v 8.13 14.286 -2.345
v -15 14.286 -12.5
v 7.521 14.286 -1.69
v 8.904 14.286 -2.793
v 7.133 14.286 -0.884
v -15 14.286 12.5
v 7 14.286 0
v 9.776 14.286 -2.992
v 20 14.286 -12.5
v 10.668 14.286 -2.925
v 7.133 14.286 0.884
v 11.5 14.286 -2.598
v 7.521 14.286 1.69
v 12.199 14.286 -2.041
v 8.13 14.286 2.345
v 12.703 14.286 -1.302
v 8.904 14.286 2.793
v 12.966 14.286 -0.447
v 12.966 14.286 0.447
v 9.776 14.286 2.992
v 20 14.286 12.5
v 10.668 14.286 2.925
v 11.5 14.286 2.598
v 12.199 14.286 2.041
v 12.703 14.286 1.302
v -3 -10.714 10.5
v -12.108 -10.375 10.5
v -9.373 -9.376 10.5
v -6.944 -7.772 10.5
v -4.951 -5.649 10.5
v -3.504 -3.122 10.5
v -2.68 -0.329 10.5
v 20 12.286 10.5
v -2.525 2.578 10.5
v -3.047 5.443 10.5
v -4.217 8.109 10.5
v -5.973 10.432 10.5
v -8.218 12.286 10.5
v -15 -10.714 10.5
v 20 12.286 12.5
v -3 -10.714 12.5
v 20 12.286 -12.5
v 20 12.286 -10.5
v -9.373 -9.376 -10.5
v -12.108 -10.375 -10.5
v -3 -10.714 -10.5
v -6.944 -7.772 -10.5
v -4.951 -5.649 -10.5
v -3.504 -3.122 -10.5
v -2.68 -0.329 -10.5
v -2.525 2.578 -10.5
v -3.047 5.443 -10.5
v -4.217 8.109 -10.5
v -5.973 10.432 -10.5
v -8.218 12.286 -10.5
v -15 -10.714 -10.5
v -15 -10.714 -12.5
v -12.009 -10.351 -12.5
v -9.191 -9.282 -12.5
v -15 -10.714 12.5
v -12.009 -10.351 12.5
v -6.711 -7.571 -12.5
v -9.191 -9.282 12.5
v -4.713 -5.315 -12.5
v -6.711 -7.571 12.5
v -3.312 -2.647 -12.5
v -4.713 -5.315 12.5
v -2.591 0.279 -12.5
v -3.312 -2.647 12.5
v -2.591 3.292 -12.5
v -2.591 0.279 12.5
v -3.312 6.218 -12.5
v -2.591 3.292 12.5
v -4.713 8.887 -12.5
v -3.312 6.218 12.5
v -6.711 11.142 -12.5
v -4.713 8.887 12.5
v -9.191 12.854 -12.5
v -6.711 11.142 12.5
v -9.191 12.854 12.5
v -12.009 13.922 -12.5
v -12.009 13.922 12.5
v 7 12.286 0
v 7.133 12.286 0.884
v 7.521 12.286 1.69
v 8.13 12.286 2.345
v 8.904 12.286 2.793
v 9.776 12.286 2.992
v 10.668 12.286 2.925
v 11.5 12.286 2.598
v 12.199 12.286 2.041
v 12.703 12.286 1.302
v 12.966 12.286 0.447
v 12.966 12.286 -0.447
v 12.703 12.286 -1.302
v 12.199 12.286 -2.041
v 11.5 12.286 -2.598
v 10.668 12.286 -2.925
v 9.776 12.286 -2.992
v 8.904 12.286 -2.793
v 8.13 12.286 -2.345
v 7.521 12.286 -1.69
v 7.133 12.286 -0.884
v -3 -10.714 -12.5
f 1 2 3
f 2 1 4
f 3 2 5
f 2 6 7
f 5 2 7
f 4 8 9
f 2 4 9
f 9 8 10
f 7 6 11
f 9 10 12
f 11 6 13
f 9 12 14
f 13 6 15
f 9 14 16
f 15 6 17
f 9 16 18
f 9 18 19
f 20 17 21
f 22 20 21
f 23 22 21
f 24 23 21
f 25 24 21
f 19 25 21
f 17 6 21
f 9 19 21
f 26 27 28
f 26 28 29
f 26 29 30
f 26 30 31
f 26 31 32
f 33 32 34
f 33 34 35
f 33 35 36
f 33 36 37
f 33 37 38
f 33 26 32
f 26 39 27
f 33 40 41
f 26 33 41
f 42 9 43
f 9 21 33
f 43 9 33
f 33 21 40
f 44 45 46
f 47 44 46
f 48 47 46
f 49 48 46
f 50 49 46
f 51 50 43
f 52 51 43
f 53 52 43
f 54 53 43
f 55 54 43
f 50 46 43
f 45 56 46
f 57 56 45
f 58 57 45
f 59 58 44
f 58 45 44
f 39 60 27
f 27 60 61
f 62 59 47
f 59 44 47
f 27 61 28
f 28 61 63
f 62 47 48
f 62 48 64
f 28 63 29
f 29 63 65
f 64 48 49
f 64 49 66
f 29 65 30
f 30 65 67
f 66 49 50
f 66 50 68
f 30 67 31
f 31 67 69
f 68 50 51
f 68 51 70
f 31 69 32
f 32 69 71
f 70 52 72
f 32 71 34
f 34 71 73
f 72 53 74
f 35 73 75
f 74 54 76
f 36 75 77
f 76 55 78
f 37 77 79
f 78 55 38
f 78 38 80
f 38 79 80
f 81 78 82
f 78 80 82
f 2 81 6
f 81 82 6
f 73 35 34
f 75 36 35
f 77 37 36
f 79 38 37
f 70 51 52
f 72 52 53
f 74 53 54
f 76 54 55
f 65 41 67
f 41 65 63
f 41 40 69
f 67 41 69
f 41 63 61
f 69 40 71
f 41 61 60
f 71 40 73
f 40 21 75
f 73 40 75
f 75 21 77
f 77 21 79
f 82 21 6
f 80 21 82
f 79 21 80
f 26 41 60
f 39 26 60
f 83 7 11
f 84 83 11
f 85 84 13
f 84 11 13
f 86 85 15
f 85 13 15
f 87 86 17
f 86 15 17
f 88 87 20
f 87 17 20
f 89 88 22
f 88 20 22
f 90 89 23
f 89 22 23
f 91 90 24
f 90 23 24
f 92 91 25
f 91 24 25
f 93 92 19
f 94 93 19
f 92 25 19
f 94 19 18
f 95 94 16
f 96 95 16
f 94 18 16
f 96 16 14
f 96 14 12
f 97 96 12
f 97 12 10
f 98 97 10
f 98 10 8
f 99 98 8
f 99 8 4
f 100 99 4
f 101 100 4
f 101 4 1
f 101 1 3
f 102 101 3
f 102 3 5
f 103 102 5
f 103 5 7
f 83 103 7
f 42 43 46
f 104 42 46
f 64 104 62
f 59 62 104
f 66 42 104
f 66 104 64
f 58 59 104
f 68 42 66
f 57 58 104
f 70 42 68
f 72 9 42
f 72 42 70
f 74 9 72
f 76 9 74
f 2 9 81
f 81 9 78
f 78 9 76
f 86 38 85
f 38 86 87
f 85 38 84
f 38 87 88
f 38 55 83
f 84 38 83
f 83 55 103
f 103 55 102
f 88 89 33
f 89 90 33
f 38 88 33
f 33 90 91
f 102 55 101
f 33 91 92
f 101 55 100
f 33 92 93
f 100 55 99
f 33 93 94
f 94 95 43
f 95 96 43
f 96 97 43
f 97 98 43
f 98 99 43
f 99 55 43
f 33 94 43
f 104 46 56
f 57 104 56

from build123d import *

# Parameters (mm, degrees)
DODANIE_WYCI_GNI_CIE1_DEPTH = 12.5
SKORUPA2_START              = -10.714285714
SKORUPA2_OUTLINE_W          = 37
SKORUPA2_OUTLINE_H          = 21
SKORUPA2_DEPTH              = 23
SZKIC2_R                    = 3
SZKIC2_R_2                  = 4
WYTNIJ_WYCI_GNI_CIE1_DEPTH  = 60


# Read off the part's stored shape, not the designer's step: Skorupa2
with BuildPart() as part:
    # Szkic1 → Dodanie-wyciągnięcie1 (new, symmetric)
    with BuildSketch(Plane.XY):
        with BuildLine():
            Line((20, 12.285714286), (-3, -10.714285714))
            Line((-3, -10.714285714), (-15, -10.714285714))
            ThreePointArc((-15, -10.714285714), (-2.5, 1.785714286), (-15, 14.285714286))
            Line((-15, 14.285714286), (20, 14.285714286))
            Line((20, 14.285714286), (20, 12.285714286))
        make_face()
    extrude(amount=DODANIE_WYCI_GNI_CIE1_DEPTH, both=True)

    # Skorupa2 outline → Skorupa2 (cut)
    with BuildSketch(Plane(origin=(0, 0, 0), x_dir=(1, 0, 0), z_dir=(0, 1, 0)).offset(SKORUPA2_START)):
        with Locations((2.5, 0)):
            Rectangle(SKORUPA2_OUTLINE_W, SKORUPA2_OUTLINE_H)
    extrude(amount=SKORUPA2_DEPTH, mode=Mode.SUBTRACT)

    # Szkic2 → Wytnij-wyciągnięcie1 (cut)
    with BuildSketch(Plane(origin=(0, 14.285714286, 0), x_dir=(1, 0, 0), z_dir=(0, 1, 0))):
        with Locations(Location((10, 0, 0), (0, 0, 180))):
            Circle(SZKIC2_R)
        with Locations((8, -24.919871589)):
            Circle(SZKIC2_R_2)
    extrude(amount=-WYTNIJ_WYCI_GNI_CIE1_DEPTH, mode=Mode.SUBTRACT)


solid = part.part
